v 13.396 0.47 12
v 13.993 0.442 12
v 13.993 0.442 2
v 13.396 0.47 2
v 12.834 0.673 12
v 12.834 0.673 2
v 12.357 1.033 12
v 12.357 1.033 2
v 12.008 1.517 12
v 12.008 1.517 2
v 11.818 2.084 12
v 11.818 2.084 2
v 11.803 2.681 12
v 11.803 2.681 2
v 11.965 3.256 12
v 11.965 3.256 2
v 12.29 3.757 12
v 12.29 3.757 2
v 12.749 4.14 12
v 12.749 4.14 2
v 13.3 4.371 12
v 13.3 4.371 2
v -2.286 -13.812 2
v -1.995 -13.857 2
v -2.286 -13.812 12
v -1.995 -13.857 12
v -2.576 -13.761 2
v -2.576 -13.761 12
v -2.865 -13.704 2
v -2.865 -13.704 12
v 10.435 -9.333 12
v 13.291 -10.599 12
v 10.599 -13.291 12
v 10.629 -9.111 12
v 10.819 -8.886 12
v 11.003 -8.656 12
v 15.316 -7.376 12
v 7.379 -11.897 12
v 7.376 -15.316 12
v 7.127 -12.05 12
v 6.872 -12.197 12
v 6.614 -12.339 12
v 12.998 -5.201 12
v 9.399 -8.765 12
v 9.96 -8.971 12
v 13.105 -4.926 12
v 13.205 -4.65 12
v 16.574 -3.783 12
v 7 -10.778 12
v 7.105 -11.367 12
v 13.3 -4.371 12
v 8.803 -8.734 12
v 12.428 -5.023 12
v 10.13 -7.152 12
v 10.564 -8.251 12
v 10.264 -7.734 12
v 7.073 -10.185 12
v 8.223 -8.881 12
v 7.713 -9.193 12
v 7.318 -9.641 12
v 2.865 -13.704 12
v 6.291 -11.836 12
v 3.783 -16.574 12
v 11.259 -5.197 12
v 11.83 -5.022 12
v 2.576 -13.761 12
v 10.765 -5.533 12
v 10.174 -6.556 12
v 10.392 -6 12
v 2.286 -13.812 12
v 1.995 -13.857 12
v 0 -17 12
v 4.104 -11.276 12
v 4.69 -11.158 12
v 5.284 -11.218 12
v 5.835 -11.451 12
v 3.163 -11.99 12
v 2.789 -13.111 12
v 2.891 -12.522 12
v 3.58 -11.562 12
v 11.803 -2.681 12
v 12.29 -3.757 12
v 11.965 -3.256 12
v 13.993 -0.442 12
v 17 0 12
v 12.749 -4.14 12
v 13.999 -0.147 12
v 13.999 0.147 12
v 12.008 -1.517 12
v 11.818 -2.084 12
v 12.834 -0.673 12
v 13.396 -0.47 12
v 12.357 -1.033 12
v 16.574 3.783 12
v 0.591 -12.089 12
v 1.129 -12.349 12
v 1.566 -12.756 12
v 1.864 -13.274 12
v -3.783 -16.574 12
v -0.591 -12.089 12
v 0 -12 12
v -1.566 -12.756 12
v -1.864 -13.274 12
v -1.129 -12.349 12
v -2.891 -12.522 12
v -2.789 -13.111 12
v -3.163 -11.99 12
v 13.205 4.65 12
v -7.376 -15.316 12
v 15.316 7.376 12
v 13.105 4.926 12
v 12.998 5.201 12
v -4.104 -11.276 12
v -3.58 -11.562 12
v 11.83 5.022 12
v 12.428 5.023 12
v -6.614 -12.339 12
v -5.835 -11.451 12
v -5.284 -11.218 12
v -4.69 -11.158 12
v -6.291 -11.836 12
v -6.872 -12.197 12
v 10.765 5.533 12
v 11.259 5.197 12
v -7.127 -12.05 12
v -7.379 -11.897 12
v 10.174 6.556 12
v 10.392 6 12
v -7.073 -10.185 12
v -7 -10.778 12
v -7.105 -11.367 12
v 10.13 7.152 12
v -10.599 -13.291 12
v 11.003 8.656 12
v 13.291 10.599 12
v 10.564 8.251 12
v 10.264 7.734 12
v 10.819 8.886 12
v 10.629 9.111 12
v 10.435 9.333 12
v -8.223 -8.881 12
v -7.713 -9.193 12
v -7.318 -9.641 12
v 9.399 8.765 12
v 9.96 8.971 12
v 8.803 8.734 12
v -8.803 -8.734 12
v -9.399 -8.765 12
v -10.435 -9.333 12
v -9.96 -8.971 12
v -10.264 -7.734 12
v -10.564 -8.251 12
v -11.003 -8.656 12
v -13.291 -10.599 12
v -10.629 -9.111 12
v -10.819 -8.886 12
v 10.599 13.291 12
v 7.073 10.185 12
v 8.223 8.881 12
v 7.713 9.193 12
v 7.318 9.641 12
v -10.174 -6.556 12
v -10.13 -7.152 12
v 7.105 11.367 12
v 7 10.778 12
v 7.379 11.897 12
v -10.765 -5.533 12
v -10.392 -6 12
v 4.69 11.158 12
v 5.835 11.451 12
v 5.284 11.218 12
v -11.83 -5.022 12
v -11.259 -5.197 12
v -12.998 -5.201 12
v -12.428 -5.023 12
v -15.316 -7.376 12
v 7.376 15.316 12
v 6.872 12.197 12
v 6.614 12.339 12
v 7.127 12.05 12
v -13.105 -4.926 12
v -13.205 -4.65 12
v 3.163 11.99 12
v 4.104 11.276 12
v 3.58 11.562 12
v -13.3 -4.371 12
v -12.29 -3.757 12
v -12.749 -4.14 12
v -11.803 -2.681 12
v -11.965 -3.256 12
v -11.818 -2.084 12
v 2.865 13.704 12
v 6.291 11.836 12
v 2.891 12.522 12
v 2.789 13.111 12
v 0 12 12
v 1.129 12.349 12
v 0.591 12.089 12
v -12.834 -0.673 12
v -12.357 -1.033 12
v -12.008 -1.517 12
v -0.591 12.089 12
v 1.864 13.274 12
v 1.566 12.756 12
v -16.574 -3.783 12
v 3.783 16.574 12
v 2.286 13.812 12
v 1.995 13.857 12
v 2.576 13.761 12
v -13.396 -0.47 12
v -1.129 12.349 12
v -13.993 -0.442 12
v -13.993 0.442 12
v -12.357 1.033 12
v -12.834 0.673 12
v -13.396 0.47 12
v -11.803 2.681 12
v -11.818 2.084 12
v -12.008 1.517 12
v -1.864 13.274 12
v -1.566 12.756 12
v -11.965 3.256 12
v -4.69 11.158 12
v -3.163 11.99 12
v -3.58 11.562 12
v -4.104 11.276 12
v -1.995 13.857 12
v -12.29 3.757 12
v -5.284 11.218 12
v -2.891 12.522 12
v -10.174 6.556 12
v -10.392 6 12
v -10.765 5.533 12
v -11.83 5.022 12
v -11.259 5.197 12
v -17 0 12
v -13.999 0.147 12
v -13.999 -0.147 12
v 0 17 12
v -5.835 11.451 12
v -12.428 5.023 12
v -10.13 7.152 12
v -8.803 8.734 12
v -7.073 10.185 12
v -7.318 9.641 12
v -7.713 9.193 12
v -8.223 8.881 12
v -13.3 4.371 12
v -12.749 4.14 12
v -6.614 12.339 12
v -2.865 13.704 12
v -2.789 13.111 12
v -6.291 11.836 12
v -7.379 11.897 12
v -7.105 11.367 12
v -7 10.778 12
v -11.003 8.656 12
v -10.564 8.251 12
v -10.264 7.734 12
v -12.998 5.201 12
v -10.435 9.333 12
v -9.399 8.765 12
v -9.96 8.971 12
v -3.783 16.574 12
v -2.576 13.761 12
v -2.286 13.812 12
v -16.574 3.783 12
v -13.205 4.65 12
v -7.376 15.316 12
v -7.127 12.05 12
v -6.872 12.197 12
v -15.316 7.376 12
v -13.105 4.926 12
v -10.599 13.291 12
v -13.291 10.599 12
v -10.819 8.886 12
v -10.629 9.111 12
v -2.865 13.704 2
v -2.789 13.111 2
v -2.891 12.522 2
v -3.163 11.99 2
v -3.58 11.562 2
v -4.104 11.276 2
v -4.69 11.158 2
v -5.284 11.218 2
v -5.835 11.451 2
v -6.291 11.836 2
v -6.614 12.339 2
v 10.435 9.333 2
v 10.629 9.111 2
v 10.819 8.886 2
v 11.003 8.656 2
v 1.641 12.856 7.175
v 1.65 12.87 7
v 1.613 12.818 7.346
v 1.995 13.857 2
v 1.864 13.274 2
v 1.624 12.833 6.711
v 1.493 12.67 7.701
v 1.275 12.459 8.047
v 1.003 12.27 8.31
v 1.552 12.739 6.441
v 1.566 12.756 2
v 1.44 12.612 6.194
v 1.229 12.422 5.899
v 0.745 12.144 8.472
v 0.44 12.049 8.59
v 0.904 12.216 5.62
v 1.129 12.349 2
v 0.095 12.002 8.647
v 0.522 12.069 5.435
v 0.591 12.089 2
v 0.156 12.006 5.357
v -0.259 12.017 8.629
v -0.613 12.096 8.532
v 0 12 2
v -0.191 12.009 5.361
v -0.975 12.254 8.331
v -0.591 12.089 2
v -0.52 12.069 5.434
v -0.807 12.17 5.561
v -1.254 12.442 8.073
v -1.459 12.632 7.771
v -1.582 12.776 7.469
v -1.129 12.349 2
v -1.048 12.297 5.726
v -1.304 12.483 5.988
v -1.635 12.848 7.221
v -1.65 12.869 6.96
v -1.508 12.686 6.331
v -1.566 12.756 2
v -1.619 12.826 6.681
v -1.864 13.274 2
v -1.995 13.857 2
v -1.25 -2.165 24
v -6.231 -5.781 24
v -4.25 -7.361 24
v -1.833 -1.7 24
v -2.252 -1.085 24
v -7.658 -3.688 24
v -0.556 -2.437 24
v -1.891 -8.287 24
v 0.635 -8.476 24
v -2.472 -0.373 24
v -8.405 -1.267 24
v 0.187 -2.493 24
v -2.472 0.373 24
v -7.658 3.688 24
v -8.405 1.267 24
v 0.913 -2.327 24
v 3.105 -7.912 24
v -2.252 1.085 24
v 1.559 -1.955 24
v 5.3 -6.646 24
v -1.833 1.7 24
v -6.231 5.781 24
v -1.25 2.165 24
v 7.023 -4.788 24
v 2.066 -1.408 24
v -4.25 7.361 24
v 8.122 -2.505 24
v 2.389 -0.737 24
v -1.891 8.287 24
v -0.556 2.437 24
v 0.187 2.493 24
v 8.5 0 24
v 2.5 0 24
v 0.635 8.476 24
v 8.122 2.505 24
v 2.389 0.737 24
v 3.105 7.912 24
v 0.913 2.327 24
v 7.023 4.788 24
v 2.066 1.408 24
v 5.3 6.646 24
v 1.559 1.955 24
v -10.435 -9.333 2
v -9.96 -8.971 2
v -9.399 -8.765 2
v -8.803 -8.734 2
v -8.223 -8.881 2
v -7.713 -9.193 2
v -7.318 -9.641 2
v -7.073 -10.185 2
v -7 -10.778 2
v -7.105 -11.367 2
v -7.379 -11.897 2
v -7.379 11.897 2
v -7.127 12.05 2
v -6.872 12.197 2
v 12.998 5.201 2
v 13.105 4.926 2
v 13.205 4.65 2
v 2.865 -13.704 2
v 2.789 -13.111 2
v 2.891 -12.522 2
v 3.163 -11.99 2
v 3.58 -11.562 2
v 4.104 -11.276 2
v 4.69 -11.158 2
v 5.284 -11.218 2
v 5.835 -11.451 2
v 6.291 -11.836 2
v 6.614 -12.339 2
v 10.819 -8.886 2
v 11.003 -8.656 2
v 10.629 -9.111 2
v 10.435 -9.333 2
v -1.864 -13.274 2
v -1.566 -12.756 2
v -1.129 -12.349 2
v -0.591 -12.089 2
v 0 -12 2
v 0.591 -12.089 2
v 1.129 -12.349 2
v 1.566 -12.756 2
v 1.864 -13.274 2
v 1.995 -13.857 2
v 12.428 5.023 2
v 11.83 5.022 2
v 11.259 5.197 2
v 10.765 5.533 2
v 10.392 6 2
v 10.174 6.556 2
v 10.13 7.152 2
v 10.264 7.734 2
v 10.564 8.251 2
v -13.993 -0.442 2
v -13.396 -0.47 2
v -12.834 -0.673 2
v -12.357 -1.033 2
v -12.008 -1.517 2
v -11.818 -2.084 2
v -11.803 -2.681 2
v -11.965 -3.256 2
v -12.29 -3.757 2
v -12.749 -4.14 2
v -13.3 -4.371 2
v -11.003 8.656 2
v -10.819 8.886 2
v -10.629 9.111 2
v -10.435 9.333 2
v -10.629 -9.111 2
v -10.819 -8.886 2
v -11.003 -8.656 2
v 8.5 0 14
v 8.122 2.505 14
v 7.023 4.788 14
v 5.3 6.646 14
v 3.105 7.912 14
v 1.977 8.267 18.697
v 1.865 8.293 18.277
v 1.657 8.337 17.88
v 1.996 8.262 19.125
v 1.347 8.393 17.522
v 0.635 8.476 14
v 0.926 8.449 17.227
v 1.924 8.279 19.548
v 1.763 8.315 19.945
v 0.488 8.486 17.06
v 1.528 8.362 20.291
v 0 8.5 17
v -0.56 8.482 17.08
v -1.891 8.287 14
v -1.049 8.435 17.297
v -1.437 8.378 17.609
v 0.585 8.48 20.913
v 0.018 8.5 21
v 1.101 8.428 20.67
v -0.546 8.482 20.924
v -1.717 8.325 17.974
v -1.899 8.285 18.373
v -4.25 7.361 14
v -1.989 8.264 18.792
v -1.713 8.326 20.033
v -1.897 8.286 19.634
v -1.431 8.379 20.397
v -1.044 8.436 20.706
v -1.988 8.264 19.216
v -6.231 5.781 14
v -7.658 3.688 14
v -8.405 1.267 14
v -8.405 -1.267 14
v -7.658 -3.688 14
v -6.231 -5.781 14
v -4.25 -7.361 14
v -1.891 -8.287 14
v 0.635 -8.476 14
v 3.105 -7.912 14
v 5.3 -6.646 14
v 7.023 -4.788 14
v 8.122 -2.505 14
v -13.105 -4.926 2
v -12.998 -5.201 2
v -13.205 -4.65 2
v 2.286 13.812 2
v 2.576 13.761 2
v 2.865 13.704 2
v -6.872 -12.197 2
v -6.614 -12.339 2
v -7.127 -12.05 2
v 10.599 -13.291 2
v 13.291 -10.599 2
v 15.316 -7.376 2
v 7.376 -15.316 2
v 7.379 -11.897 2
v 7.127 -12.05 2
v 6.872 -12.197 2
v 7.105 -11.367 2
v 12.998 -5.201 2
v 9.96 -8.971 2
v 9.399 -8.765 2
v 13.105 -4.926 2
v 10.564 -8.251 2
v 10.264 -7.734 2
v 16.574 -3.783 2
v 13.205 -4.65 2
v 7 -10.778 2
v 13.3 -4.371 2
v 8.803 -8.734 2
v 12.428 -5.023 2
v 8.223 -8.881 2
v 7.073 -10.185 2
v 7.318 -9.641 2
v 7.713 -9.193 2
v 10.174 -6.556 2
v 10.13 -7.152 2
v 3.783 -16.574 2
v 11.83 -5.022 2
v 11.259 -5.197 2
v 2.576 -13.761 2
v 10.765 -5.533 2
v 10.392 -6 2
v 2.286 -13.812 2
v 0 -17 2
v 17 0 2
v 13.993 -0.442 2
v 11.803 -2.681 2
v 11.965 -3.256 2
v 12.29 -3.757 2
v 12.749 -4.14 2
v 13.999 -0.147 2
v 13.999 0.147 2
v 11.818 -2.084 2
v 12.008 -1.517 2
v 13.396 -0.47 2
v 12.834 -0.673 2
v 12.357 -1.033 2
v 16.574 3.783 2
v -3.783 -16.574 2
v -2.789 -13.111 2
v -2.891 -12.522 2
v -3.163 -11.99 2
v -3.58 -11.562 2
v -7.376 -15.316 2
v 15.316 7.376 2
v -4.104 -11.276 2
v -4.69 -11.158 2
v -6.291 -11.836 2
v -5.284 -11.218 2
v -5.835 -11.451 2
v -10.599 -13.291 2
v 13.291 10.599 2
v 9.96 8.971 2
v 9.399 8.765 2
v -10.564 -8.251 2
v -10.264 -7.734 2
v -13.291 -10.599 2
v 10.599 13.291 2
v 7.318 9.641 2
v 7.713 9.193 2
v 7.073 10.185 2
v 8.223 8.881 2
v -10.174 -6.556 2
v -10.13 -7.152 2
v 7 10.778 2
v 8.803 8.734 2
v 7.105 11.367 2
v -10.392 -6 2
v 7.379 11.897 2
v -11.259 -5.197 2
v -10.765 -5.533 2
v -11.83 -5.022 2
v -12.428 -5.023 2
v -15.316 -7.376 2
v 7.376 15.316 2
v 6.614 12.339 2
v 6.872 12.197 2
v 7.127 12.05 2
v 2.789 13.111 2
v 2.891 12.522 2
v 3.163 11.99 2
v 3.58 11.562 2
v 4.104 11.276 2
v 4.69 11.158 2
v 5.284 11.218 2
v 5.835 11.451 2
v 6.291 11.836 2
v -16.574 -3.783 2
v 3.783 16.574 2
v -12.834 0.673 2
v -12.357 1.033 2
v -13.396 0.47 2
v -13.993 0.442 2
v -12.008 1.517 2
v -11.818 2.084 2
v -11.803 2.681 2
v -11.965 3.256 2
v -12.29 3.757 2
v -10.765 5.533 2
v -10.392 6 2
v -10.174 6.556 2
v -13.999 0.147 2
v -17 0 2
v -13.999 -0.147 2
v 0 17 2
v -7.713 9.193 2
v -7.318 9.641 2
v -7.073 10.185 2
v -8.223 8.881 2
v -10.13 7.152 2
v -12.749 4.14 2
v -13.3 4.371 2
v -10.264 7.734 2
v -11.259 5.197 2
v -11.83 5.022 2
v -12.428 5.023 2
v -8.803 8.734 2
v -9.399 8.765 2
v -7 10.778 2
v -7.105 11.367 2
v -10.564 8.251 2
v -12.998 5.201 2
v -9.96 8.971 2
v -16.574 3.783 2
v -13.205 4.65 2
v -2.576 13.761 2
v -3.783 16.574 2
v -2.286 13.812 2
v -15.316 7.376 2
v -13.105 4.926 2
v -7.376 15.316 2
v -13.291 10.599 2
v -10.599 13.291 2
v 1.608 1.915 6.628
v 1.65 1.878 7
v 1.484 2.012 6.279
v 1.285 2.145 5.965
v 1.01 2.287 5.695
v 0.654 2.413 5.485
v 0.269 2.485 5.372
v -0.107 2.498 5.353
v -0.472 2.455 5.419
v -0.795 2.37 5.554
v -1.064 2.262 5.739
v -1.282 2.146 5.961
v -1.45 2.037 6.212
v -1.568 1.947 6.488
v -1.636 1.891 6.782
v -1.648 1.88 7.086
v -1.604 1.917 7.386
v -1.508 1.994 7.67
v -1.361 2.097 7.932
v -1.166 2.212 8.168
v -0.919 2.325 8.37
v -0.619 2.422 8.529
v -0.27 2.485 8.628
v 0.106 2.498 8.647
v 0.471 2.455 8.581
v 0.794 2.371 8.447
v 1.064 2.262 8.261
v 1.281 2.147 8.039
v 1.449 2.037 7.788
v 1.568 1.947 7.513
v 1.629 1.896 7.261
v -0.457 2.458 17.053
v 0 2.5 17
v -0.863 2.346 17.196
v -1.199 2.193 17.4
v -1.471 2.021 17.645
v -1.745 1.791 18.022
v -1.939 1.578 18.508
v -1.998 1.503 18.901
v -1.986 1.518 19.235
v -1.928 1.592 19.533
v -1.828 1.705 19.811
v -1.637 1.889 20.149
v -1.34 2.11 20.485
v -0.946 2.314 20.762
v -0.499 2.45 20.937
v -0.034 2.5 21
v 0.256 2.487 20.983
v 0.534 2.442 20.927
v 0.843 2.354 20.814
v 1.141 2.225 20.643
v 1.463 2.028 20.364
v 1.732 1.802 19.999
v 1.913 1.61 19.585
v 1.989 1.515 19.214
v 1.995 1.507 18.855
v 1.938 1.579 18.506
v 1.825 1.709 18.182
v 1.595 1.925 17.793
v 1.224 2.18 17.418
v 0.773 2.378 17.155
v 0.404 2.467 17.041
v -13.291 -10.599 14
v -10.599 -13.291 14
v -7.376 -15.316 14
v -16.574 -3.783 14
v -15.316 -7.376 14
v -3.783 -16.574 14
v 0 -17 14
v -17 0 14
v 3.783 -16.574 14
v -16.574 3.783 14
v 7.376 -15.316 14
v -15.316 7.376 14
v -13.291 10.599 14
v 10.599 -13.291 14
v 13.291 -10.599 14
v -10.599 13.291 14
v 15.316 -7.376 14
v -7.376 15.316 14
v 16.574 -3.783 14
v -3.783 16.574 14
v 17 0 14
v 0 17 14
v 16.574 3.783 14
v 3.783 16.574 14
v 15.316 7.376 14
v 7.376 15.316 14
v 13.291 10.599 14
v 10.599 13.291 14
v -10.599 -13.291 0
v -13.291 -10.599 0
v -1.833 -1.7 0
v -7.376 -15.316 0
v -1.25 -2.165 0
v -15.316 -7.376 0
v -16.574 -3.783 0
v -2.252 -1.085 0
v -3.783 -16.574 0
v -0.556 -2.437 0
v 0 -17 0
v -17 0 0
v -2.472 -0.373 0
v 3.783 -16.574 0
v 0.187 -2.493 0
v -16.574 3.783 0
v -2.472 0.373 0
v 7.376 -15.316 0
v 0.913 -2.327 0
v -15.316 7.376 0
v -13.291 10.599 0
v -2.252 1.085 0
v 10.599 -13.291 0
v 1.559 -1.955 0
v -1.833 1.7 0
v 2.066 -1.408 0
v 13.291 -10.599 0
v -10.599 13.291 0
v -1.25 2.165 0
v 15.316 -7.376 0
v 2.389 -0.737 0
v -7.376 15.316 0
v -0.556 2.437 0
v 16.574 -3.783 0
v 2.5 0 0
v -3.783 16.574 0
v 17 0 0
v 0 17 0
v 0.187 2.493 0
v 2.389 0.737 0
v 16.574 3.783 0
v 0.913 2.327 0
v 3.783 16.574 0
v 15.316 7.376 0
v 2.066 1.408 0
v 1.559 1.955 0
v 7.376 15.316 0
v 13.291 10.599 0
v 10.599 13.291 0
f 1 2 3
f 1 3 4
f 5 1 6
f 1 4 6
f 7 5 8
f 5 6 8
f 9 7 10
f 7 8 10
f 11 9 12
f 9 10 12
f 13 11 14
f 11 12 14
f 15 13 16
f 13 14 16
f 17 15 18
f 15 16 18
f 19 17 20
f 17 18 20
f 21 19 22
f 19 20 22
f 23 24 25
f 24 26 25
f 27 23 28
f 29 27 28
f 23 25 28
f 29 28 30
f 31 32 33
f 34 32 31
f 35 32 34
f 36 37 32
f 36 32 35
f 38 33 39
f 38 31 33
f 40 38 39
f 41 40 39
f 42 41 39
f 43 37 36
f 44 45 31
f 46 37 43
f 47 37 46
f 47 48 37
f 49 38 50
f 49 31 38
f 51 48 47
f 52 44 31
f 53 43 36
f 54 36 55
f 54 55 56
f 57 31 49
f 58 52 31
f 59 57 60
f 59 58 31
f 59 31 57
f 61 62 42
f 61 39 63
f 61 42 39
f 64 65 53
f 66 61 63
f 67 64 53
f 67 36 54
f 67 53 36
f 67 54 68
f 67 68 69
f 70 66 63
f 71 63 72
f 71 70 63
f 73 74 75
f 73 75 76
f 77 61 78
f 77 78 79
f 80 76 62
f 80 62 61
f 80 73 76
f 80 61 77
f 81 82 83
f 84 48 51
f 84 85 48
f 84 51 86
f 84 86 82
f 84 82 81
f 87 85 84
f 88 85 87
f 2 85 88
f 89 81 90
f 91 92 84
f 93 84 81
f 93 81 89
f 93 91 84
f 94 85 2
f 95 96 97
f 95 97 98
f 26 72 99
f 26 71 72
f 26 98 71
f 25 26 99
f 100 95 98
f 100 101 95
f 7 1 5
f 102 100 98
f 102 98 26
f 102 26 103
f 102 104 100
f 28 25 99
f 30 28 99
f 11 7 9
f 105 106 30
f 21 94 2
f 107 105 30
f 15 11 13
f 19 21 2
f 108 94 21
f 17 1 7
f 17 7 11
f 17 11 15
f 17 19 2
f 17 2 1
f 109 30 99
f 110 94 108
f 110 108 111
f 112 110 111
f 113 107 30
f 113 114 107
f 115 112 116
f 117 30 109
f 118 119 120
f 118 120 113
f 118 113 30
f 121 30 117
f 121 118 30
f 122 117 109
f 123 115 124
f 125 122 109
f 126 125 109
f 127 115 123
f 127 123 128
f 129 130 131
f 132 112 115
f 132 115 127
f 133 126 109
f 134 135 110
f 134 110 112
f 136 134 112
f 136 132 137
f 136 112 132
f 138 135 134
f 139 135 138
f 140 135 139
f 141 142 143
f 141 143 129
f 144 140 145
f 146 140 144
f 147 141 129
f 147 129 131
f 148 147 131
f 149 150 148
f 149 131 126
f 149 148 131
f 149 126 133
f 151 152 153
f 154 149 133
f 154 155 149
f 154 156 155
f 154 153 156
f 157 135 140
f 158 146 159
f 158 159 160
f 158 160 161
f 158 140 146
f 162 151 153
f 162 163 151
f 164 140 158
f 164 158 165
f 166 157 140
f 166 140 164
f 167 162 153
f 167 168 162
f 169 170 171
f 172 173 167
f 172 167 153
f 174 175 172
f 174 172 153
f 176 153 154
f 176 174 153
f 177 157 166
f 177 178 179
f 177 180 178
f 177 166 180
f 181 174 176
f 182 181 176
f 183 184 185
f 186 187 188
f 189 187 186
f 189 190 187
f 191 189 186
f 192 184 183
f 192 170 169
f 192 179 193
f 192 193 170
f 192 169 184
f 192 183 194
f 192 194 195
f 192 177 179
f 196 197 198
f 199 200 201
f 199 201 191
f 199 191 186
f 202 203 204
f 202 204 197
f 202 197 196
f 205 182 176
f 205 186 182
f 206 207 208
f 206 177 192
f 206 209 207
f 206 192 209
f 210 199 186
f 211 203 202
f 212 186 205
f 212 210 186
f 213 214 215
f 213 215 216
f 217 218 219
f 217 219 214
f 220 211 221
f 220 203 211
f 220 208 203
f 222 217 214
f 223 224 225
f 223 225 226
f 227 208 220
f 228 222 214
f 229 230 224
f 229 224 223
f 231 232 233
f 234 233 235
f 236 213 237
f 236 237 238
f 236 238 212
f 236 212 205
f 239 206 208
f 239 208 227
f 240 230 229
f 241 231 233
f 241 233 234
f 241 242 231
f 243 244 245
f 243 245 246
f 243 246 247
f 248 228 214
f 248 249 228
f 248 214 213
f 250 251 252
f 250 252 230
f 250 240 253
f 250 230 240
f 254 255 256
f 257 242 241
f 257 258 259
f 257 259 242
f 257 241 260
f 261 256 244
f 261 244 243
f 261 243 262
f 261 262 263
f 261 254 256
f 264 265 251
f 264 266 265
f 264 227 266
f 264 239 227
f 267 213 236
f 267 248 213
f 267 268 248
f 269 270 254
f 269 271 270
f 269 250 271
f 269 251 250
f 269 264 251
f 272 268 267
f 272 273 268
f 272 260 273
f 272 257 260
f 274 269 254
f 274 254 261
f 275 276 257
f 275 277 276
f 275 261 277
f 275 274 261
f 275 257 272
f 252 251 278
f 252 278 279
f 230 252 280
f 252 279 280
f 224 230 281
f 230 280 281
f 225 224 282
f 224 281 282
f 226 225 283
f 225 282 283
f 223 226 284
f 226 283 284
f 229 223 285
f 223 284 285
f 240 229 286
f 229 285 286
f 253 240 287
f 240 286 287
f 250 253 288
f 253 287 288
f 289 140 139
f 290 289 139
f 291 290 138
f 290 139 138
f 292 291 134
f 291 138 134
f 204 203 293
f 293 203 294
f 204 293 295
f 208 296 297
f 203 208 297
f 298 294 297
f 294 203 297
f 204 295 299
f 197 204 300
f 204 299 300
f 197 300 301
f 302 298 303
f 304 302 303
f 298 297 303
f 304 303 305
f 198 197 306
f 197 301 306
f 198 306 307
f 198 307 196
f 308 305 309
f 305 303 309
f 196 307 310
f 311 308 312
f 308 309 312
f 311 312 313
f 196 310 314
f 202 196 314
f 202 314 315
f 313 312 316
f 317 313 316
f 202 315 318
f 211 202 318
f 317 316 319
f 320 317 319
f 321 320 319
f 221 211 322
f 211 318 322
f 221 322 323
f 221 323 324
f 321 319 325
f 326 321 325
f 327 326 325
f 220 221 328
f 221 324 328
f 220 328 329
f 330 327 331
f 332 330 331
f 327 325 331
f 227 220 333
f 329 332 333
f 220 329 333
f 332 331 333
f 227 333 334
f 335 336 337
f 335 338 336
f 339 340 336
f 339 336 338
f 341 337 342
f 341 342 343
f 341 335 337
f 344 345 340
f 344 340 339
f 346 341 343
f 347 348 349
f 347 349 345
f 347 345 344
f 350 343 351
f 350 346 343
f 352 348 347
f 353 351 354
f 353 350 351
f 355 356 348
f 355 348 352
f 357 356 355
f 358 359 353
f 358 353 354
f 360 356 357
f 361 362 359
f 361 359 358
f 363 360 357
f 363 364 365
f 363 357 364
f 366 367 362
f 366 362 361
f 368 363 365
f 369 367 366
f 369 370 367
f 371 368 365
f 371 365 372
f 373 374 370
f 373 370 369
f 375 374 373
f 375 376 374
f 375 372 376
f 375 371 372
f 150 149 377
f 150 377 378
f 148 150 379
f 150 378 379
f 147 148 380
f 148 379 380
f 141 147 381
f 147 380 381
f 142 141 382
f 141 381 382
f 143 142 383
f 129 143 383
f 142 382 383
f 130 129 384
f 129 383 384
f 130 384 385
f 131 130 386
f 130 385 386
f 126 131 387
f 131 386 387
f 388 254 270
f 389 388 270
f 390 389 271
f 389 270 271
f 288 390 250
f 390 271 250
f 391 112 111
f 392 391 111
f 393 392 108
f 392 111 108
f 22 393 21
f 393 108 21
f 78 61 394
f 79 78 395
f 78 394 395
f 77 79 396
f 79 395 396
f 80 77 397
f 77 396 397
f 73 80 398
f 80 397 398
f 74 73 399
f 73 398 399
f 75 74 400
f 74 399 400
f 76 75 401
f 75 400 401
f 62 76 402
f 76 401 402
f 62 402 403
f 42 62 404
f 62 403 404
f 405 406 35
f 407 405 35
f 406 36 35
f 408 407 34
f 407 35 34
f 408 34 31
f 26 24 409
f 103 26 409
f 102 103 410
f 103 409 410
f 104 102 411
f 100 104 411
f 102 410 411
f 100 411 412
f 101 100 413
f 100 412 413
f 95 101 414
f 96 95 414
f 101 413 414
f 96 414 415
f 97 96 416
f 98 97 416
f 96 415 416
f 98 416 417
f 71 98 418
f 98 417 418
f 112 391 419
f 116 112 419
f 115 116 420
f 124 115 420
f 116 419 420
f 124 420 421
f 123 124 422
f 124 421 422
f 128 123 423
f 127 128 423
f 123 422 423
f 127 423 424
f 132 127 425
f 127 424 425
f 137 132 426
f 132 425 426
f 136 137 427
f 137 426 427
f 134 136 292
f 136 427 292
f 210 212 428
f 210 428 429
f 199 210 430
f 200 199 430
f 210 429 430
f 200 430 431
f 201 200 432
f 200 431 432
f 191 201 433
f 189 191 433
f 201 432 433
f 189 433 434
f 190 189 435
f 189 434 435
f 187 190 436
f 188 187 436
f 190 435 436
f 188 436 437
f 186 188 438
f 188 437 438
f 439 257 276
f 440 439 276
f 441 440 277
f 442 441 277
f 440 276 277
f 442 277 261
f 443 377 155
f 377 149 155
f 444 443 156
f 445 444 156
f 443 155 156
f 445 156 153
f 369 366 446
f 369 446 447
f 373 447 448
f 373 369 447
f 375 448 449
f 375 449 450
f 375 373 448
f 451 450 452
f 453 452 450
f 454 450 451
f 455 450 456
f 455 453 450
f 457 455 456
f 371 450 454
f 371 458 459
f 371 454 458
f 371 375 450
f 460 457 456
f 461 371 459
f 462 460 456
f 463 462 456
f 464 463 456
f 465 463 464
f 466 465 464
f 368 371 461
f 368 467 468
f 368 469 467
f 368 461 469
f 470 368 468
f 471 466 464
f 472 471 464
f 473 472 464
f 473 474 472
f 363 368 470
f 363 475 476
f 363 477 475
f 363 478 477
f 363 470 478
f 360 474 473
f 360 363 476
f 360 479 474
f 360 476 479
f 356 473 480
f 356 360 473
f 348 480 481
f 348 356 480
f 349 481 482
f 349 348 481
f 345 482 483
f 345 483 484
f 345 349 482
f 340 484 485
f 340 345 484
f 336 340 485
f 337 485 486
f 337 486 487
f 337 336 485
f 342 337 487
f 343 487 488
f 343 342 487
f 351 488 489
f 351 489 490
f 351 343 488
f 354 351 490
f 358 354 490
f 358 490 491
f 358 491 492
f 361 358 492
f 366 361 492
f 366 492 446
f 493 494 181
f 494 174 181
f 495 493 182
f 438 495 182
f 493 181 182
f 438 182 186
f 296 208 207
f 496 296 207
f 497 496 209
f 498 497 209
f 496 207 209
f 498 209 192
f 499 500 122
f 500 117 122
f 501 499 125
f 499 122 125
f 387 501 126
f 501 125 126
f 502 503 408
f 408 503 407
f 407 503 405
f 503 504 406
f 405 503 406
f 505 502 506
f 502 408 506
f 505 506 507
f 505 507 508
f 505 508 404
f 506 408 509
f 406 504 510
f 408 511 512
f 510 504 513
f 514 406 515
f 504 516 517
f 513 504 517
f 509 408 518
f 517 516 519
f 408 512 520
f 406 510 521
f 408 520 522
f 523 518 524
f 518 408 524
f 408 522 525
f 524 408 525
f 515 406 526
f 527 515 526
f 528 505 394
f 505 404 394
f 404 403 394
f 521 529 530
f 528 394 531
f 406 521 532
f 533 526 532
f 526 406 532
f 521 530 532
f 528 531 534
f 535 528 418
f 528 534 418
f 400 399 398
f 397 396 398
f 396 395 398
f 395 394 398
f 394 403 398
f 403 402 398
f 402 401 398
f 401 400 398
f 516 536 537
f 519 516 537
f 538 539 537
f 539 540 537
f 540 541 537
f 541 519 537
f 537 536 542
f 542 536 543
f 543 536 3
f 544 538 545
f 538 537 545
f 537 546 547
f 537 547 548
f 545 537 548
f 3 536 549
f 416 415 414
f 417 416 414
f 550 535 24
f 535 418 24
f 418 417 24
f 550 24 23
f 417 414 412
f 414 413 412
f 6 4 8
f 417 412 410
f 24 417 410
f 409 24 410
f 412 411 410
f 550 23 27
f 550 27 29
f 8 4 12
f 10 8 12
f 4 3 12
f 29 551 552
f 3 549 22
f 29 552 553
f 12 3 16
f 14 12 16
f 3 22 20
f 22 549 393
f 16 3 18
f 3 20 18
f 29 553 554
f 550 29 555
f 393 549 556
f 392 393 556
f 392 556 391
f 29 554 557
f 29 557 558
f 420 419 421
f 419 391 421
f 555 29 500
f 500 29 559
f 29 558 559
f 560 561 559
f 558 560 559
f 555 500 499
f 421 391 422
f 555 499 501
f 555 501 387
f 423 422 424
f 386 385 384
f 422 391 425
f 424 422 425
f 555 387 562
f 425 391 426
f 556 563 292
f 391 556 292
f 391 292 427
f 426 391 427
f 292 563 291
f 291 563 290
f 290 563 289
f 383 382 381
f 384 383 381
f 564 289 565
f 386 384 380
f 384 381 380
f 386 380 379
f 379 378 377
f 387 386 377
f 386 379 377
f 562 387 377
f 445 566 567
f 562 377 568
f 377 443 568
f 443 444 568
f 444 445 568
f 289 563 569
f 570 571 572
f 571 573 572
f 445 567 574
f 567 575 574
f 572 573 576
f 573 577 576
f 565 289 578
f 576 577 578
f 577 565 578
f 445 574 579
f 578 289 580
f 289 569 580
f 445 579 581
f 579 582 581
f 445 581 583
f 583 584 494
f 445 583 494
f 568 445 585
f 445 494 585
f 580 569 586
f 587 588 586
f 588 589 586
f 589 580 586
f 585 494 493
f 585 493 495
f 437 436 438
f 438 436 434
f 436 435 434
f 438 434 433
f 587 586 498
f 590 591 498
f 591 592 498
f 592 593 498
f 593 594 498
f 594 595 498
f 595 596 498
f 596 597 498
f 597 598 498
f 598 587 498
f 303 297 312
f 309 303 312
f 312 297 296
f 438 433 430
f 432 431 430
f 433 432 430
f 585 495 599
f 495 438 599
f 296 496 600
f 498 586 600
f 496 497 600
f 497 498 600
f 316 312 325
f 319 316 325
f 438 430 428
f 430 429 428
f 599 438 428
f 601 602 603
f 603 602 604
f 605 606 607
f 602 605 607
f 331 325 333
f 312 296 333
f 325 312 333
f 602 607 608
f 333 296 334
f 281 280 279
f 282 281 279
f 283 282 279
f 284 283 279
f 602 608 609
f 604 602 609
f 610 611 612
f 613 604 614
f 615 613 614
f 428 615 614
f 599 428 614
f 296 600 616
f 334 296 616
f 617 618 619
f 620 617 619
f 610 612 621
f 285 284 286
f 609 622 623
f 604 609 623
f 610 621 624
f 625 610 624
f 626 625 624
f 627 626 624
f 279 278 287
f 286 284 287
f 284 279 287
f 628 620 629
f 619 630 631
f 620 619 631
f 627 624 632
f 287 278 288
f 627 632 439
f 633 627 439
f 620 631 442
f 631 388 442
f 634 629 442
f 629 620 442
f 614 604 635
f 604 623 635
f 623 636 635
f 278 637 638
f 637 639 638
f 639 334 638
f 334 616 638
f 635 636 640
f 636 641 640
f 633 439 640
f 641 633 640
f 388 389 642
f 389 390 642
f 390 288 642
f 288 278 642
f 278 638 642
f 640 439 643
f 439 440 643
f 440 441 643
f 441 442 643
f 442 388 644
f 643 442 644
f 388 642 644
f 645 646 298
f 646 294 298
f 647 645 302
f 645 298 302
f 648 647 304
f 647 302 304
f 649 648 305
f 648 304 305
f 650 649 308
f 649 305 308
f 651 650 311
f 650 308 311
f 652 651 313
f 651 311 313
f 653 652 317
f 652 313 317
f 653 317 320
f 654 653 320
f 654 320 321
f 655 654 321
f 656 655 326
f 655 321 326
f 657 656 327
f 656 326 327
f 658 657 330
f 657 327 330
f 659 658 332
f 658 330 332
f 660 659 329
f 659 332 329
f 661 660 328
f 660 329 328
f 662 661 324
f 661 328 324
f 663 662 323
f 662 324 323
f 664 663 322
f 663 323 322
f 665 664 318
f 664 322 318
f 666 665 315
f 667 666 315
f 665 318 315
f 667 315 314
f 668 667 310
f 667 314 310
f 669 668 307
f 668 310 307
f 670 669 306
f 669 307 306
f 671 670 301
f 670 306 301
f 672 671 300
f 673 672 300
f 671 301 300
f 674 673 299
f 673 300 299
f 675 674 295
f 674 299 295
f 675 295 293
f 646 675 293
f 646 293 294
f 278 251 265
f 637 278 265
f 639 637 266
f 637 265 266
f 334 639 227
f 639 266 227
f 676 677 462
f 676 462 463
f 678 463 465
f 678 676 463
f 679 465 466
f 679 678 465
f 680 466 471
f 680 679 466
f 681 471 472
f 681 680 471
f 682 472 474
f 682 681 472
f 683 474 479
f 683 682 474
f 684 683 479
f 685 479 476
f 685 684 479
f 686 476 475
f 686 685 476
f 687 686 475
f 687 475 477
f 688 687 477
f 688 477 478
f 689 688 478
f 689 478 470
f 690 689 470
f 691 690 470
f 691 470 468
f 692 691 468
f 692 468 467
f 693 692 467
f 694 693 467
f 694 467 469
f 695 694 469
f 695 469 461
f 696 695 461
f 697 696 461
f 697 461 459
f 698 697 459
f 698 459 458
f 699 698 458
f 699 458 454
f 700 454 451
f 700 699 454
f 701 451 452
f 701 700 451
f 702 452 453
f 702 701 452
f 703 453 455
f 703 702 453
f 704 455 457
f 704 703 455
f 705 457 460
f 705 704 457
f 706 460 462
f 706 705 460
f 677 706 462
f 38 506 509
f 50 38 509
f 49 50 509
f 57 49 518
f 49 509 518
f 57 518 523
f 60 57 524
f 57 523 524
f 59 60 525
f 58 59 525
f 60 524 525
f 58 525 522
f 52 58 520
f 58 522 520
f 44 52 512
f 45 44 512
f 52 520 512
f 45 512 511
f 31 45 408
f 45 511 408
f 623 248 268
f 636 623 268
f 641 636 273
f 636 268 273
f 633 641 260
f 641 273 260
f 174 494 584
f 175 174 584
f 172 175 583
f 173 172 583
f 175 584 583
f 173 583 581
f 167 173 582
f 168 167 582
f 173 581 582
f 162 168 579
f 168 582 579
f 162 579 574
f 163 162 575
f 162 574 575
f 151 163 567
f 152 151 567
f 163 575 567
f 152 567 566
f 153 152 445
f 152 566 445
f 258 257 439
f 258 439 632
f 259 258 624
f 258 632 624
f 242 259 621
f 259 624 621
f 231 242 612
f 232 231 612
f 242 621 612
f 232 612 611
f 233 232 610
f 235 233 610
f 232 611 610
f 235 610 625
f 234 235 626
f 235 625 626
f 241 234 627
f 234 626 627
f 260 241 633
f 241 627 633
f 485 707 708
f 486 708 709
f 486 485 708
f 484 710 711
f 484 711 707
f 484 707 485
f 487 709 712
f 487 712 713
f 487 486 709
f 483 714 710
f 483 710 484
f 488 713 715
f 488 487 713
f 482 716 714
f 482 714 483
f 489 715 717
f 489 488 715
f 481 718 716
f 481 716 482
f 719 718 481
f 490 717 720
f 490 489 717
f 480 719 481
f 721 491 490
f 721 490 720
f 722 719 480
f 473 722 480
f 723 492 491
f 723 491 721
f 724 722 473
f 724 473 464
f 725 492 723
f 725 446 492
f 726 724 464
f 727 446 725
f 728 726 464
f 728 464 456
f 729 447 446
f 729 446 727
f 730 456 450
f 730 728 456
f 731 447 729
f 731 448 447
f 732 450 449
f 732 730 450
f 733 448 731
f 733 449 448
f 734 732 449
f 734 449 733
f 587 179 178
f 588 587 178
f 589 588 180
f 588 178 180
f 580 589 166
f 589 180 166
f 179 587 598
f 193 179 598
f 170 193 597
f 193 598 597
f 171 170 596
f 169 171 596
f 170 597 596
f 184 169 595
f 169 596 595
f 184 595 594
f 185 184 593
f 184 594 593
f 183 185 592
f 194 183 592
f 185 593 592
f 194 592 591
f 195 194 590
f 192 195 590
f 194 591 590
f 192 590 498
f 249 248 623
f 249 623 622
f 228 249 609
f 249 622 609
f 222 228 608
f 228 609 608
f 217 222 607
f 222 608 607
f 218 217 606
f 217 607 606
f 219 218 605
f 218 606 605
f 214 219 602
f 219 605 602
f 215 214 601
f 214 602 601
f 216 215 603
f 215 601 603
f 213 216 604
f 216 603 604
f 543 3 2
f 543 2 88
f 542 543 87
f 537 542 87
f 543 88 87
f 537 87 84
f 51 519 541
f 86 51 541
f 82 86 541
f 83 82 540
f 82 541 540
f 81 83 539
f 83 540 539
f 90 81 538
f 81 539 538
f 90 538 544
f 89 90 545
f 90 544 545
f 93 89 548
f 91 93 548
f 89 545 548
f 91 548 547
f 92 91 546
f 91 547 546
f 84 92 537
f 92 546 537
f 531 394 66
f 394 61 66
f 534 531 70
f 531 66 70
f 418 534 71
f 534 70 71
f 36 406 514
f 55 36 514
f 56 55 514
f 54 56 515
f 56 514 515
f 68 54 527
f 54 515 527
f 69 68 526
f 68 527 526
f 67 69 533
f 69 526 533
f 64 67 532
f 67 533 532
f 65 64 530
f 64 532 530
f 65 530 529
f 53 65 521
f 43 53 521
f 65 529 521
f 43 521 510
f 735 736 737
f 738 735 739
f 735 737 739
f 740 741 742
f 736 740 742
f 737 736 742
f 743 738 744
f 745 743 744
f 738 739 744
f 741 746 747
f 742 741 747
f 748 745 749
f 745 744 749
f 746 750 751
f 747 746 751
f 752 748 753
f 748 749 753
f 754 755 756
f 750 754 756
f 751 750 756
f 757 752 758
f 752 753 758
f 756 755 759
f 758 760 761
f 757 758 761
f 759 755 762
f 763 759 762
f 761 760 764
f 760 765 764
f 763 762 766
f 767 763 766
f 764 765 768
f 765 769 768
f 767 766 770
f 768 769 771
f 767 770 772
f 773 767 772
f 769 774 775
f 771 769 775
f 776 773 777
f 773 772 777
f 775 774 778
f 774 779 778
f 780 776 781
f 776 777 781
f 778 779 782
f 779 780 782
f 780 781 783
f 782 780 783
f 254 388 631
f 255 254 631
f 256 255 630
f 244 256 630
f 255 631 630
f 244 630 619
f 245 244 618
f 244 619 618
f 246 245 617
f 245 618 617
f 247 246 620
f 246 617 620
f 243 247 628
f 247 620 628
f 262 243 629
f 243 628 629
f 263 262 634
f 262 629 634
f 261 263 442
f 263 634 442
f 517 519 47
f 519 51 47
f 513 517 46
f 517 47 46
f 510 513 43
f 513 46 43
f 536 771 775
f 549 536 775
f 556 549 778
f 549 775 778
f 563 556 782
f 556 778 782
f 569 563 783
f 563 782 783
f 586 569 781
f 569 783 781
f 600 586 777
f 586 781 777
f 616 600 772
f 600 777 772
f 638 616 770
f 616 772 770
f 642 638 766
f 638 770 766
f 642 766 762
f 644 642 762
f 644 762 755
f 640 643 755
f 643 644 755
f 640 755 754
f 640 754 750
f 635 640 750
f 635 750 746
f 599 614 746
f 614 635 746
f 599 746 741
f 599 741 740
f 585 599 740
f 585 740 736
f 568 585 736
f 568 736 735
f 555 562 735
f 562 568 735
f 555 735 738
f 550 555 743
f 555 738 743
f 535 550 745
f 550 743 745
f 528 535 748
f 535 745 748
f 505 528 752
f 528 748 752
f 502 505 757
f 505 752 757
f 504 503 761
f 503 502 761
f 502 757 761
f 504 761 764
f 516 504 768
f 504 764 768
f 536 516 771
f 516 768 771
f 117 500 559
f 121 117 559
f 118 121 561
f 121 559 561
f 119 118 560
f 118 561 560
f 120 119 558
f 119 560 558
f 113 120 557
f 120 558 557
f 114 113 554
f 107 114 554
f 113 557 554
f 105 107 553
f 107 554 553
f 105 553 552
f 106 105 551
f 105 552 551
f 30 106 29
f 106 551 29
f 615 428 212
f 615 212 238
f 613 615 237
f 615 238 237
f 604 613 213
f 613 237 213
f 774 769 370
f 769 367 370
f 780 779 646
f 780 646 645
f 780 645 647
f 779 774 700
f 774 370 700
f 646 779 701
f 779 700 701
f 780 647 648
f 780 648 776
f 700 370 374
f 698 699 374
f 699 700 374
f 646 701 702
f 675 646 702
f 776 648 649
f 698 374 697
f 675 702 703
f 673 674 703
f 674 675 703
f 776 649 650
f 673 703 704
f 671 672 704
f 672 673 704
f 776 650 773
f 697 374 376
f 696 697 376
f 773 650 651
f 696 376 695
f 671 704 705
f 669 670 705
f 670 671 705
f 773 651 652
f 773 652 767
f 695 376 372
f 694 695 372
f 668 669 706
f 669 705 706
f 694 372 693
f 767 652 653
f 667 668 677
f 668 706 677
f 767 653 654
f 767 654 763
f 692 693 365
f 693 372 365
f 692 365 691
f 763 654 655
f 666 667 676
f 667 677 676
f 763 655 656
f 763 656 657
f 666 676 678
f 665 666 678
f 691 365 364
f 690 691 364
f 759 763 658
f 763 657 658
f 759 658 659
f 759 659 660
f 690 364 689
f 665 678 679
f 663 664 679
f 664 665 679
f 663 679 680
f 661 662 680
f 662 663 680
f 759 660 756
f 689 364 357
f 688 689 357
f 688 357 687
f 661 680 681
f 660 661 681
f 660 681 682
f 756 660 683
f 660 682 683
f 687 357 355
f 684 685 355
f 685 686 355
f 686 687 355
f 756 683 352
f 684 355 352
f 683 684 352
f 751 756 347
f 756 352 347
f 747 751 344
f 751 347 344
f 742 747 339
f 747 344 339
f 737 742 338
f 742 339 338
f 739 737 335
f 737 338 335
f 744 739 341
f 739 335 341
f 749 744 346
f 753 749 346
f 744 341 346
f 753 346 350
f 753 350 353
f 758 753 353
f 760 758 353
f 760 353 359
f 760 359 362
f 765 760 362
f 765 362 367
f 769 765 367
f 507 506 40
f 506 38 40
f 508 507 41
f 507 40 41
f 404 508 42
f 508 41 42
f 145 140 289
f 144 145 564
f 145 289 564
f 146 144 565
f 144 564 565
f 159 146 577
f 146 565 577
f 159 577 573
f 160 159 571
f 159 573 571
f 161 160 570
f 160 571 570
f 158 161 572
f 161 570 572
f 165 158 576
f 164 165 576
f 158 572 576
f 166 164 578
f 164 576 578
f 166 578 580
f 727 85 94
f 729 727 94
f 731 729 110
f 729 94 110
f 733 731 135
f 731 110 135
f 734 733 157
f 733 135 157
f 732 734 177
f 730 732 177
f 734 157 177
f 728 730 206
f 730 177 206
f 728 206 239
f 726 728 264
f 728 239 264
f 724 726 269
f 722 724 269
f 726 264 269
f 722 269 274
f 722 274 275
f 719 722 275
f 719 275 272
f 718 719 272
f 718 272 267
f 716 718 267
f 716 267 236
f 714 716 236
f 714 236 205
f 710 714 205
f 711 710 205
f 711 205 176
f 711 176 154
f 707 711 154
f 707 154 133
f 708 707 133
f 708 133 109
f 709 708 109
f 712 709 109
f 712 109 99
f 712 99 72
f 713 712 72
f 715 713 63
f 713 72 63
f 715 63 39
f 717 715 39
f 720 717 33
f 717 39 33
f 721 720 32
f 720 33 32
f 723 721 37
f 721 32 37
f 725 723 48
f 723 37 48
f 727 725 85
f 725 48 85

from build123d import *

# Parameters (mm, degrees)
SKETCH1_R                 = 17
BOSS_EXTRUDE1_DEPTH       = 14
CUT_EXTRUDE2_REACH        = 29.821
SKETCH3_R                 = 2.5
BOSS_EXTRUDE2_START       = 10
SKETCH5_R                 = 8.5
SKETCH5_R_2               = 2.5
BOSS_EXTRUDE2_DEPTH       = 10
SKETCH7_R                 = 17
SKETCH7_R_2               = 14
CUT_EXTRUDE5_DEPTH        = 5
SKETCH8_R                 = 2
CUT_EXTRUDE6_DEPTH        = 5
SKETCH9_R                 = 2
CUT_EXTRUDE7_DEPTH        = 10
M4_TAPPED_HOLE2_OUTLINE_W = 1.65
M4_TAPPED_HOLE2_OUTLINE_H = 10.992017373


with BuildPart() as part:
    # Sketch1 → Boss-Extrude1 (new body)
    with BuildSketch(Plane.XY):
        Circle(SKETCH1_R)
    extrude(amount=BOSS_EXTRUDE1_DEPTH)

    # Sketch3 → Cut-Extrude2 (cut, up to next)
    with BuildSketch(Plane.XY.offset(14), mode=Mode.PRIVATE) as cut_extrude2_sk1:
        Circle(SKETCH3_R)
    cut_extrude2_tool1 = extrude(cut_extrude2_sk1.sketch, amount=-CUT_EXTRUDE2_REACH, mode=Mode.PRIVATE) & part.part
    add(cut_extrude2_tool1.solids().sort_by_distance((0, 0, 14))[0], mode=Mode.SUBTRACT)

    # Sketch5 → Boss-Extrude2 (add)
    with BuildSketch(Plane.XY.offset(14).offset(BOSS_EXTRUDE2_START)):
        Circle(SKETCH5_R)
        Circle(SKETCH5_R_2, mode=Mode.SUBTRACT)
    extrude(amount=-BOSS_EXTRUDE2_DEPTH)

    # Sketch7 → Cut-Extrude5 (cut, symmetric)
    with BuildSketch(Plane(origin=(0, 0, 7), x_dir=(-1, 0, 0), z_dir=(0, 0, -1))):
        Circle(SKETCH7_R)
        Circle(SKETCH7_R_2, mode=Mode.SUBTRACT)
    extrude(amount=CUT_EXTRUDE5_DEPTH, both=True, mode=Mode.SUBTRACT)

    # Sketch8 → Cut-Extrude6 (cut, symmetric)
    with BuildSketch(Plane(origin=(0, 0, 7), x_dir=(-1, 0, 0), z_dir=(0, 0, -1))):
        with Locations((0, 14)):
            Circle(SKETCH8_R)
        with Locations((4.788282007, 13.155696691)):
            Circle(SKETCH8_R)
        with Locations((8.999026536, 10.724622204)):
            Circle(SKETCH8_R)
        with Locations((12.124355653, 7)):
            Circle(SKETCH8_R)
        with Locations((13.787308542, 2.431074487)):
            Circle(SKETCH8_R)
        with Locations((13.787308542, -2.431074487)):
            Circle(SKETCH8_R)
        with Locations((12.124355653, -7)):
            Circle(SKETCH8_R)
        with Locations((8.999026536, -10.724622204)):
            Circle(SKETCH8_R)
        with Locations((4.788282007, -13.155696691)):
            Circle(SKETCH8_R)
        with Locations((0, -14)):
            Circle(SKETCH8_R)
        with Locations((-4.788282007, -13.155696691)):
            Circle(SKETCH8_R)
        with Locations((-8.999026536, -10.724622204)):
            Circle(SKETCH8_R)
        with Locations((-12.124355653, -7)):
            Circle(SKETCH8_R)
        with Locations((-13.787308542, -2.431074487)):
            Circle(SKETCH8_R)
        with Locations((-13.787308542, 2.431074487)):
            Circle(SKETCH8_R)
        with Locations((-12.124355653, 7)):
            Circle(SKETCH8_R)
        with Locations((-8.999026536, 10.724622204)):
            Circle(SKETCH8_R)
        with Locations((-4.788282007, 13.155696691)):
            Circle(SKETCH8_R)
    extrude(amount=CUT_EXTRUDE6_DEPTH, both=True, mode=Mode.SUBTRACT)

    # Sketch9 → Cut-Extrude7 (cut)
    with BuildSketch(Plane(origin=(0, 0, 0), x_dir=(1, 0, 0), z_dir=(0, 1, 0))):
        with Locations(Location((0, -19, 0), (0, 0, 90))):
            Circle(SKETCH9_R)
    extrude(amount=CUT_EXTRUDE7_DEPTH, mode=Mode.SUBTRACT)

    # M4 Tapped Hole2: read off the stored shape, not the designer's step
    # M4 Tapped Hole2 outline → M4 Tapped Hole2 (revolve, cut)
    with BuildSketch(Plane.XY.offset(7)):
        with Locations((0.825, 7.373848872)):
            Rectangle(M4_TAPPED_HOLE2_OUTLINE_W, M4_TAPPED_HOLE2_OUTLINE_H)
    revolve(axis=Axis((0, 0, 7), (0, 1, 0)), mode=Mode.SUBTRACT)


solid = part.part
